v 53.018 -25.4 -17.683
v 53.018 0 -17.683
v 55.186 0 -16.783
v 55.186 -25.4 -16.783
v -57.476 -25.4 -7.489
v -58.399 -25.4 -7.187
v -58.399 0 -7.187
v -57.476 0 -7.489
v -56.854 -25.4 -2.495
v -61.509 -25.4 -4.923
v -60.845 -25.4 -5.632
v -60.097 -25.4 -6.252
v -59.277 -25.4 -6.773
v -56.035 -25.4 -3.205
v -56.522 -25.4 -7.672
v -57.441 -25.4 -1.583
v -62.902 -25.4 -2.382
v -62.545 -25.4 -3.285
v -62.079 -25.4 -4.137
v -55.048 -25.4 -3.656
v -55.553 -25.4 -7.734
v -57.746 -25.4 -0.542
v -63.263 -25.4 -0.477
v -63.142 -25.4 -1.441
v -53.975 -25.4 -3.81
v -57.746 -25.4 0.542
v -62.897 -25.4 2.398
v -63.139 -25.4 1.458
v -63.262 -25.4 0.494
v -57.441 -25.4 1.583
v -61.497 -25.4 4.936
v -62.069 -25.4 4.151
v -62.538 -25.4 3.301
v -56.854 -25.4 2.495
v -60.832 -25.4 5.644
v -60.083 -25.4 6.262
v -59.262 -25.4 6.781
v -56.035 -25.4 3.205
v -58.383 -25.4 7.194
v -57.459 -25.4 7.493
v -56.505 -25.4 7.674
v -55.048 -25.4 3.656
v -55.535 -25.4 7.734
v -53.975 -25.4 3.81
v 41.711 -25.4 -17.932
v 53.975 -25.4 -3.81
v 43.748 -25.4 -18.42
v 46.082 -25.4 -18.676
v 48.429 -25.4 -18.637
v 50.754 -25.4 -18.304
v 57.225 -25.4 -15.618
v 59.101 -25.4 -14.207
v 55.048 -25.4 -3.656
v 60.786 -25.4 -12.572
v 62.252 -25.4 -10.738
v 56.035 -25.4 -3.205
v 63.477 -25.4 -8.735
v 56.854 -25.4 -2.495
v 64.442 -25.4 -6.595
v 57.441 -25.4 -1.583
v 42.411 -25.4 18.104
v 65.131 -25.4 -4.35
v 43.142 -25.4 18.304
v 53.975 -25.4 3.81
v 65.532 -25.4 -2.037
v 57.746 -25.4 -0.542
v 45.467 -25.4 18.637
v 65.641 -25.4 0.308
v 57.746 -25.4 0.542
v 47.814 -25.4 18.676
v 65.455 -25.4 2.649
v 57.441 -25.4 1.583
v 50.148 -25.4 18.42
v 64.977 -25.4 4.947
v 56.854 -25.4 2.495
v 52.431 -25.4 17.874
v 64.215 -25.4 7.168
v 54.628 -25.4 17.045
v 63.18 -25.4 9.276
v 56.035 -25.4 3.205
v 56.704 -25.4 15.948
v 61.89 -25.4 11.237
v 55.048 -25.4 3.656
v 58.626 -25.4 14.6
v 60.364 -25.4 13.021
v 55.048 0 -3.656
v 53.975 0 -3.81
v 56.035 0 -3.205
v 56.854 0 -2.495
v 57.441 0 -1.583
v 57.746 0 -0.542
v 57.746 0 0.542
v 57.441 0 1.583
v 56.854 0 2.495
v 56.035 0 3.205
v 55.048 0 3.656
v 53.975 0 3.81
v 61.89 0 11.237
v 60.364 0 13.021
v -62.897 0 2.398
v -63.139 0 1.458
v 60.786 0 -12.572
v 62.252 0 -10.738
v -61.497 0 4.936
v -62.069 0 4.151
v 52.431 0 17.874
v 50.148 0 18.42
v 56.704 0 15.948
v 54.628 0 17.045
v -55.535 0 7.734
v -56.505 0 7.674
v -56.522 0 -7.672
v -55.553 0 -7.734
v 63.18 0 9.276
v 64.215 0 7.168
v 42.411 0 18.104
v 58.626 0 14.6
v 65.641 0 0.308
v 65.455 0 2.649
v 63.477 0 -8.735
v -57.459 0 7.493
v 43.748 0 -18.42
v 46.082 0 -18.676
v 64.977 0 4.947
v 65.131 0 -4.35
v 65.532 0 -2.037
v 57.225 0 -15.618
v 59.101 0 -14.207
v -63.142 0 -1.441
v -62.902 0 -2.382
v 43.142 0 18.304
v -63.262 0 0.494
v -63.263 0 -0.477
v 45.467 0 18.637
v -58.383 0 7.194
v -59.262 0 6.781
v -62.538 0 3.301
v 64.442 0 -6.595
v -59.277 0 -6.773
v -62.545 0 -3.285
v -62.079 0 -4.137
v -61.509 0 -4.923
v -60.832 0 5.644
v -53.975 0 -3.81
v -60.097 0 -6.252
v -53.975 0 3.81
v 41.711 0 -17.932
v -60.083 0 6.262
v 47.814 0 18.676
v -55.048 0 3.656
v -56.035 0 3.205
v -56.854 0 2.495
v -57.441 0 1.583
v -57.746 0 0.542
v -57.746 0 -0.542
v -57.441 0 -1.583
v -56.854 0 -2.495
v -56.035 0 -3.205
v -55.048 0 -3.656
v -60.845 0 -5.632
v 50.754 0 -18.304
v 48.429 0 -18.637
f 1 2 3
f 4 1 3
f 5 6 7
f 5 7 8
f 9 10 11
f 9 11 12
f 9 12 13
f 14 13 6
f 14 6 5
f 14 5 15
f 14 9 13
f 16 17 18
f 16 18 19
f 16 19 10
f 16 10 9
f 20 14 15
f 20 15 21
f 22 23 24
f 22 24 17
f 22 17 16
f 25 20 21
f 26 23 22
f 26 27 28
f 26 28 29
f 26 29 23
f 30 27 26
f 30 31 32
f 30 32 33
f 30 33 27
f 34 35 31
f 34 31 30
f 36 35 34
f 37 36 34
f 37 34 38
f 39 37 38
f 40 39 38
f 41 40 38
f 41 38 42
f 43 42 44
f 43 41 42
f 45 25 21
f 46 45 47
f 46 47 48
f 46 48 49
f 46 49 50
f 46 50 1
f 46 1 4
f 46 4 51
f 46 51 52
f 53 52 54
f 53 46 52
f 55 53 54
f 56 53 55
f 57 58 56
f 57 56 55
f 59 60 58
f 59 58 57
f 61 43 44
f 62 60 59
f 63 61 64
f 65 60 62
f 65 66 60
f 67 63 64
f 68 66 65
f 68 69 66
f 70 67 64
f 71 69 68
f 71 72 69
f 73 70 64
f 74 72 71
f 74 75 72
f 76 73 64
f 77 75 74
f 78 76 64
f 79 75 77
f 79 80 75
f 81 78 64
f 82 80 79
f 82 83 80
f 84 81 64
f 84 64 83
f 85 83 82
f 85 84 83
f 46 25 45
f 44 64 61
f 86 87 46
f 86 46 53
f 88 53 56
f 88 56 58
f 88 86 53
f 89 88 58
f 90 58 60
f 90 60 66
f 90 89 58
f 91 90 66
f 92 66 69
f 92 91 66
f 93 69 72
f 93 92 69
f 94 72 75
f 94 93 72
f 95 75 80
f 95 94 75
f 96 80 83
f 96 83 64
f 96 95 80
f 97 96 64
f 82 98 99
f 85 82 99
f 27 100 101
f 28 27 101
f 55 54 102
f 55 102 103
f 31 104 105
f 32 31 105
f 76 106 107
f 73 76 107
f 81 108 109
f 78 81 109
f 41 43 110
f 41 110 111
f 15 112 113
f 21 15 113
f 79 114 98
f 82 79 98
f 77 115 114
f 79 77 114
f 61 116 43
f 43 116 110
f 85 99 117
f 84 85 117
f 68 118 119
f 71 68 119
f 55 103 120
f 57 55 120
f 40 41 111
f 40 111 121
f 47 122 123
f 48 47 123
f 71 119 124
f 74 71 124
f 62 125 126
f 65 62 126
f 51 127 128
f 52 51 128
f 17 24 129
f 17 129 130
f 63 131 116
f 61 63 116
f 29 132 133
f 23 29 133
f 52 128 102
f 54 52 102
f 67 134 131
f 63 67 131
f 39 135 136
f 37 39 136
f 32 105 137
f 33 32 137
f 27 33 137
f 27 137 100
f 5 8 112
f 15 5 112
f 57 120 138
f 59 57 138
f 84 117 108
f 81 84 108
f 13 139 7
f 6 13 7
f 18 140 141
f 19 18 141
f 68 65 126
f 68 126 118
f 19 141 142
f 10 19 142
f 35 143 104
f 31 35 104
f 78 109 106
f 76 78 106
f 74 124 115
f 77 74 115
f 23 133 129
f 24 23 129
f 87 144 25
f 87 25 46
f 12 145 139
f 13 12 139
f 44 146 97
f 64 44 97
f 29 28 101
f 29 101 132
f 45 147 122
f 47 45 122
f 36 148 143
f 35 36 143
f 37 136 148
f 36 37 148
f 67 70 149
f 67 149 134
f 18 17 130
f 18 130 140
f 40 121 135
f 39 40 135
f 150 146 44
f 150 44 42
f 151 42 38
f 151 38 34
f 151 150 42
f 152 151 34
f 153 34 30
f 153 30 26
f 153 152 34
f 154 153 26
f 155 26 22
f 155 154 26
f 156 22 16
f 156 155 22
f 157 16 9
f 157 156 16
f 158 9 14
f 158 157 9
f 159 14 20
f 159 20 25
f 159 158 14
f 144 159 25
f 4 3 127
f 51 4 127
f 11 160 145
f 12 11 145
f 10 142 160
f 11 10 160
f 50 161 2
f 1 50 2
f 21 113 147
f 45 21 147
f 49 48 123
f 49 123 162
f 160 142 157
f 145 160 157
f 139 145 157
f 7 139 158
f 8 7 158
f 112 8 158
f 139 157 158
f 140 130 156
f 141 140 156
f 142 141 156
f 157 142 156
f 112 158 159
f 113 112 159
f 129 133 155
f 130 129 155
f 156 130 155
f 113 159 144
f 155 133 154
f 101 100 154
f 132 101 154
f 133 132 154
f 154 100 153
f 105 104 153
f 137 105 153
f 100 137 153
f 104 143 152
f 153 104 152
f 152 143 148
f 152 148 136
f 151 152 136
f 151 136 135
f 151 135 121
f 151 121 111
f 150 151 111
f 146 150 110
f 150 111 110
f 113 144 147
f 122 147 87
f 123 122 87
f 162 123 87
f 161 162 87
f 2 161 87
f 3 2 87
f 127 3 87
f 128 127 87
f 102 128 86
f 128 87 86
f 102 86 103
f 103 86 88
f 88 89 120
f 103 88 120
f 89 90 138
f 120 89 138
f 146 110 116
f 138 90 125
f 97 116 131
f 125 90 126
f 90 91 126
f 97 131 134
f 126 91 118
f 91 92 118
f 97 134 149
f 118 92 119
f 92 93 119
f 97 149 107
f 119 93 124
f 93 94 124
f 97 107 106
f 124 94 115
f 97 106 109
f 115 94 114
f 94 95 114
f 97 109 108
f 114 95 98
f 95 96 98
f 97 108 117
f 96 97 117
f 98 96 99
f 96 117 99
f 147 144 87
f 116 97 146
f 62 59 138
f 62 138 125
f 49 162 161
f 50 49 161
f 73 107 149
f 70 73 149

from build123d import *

# Parameters (mm, degrees)
F1_DEPTH = 25.4
F2_W     = 107.95
F2_H     = 7.62
F3_DEPTH = 25.4


with BuildPart() as f1:
    # F0 (on Front) → F1 (new body)
    with BuildSketch(Plane.XZ):
        Polygon((34.795007, 14.206795), (36.671421, 15.617947), (38.709903, 16.782795), (40.878305, 17.682968), (42.411124, 18.103591), (-55.535455, 7.733652), (-54.566239, 7.671582), (-53.612446, 7.488527), (-52.689117, 7.187373), (-51.810813, 6.77287), (-50.991386, 6.251554), (-50.243758, 5.631648), (-49.57972, 4.922928), (-49.009745, 4.13657), (-48.542821, 3.284975), (-48.186312, 2.381575), (-47.94584, 1.440616), (-47.825198, 0.476938), (-47.826288, -0.494263), (-47.949093, -1.457668), (-48.191676, -2.398085), (-48.550212, -3.300683), (-49.019046, -4.151227), (-49.590785, -4.936303), (-50.256412, -5.643531), (-51.005429, -6.261758), (-51.826025, -6.781233), (-52.705257, -7.193763), (-53.62926, -7.492844), (-54.583462, -7.673758), (-55.552814, -7.733652), (41.71096, -17.93242), (41.464741, -17.873512), (39.267833, -17.045337), (37.192046, -15.948346), (35.270117, -14.599841), (33.532356, -13.021087), (32.006168, -11.236983), (30.715621, -9.275665), (29.681069, -7.168064), (28.918828, -4.947418), (28.440918, -2.648749), (28.254875, -0.308308), (28.363635, 2.036996), (28.765482, 4.350175), (29.454078, 6.59475), (30.418564, 8.735321), (31.64373, 10.738131), (33.110254, 12.571594), align=None)
        Polygon((38.709903, 16.782795), (36.671421, 15.617947), (34.795007, 14.206795), (33.110254, 12.571594), (31.64373, 10.738131), (30.418564, 8.735321), (29.454078, 6.59475), (28.765482, 4.350175), (28.363635, 2.036996), (28.254875, -0.308308), (28.440918, -2.648749), (28.918828, -4.947418), (29.681069, -7.168064), (30.715621, -9.275665), (32.006168, -11.236983), (33.532356, -13.021087), (35.270117, -14.599841), (37.192046, -15.948346), (39.267833, -17.045337), (41.464741, -17.873512), (41.71096, -17.93242), (48.429475, -18.636902), (50.753616, -18.30427), (53.017741, -17.682968), (55.186143, -16.782795), (57.224625, -15.617947), (59.101039, -14.206795), (60.785793, -12.571594), (62.252316, -10.738131), (63.477482, -8.735321), (64.441968, -6.59475), (65.130564, -4.350175), (65.532411, -2.036996), (65.641171, 0.308308), (65.455129, 2.648749), (64.977218, 4.947418), (64.214977, 7.168064), (63.180425, 9.275665), (61.889879, 11.236983), (60.36369, 13.021087), (58.625929, 14.599841), (56.704, 15.948346), (54.628213, 17.045337), (52.431306, 17.873512), (50.147923, 18.419812), (47.814076, 18.67562), (42.411124, 18.103591), (40.878305, 17.682968), align=None)
        Polygon((43.14243, 18.30427), (42.411124, 18.103591), (47.814076, 18.67562), (45.466571, 18.636902), align=None)
        Polygon((-54.566239, 7.671582), (-55.535455, 7.733652), (-56.504807, 7.673758), (-57.459008, 7.492844), (-58.383011, 7.193763), (-59.262244, 6.781233), (-60.082839, 6.261758), (-60.831856, 5.643531), (-61.497483, 4.936303), (-62.069222, 4.151227), (-62.538056, 3.300683), (-62.896592, 2.398085), (-63.139176, 1.457668), (-63.261981, 0.494263), (-63.263071, -0.476938), (-63.142429, -1.440616), (-62.901957, -2.381575), (-62.545448, -3.284975), (-62.078524, -4.13657), (-61.508548, -4.922928), (-60.844511, -5.631648), (-60.096883, -6.251554), (-59.277456, -6.77287), (-58.399152, -7.187373), (-57.475822, -7.488527), (-56.522029, -7.671582), (-55.552814, -7.733652), (-54.583462, -7.673758), (-53.62926, -7.492844), (-52.705257, -7.193763), (-51.826025, -6.781233), (-51.005429, -6.261758), (-50.256412, -5.643531), (-49.590785, -4.936303), (-49.019046, -4.151227), (-48.550212, -3.300683), (-48.191676, -2.398085), (-47.949093, -1.457668), (-47.826288, -0.494263), (-47.825198, 0.476938), (-47.94584, 1.440616), (-48.186312, 2.381575), (-48.542821, 3.284975), (-49.009745, 4.13657), (-49.57972, 4.922928), (-50.243758, 5.631648), (-50.991386, 6.251554), (-51.810813, 6.77287), (-52.689117, 7.187373), (-53.612446, 7.488527), align=None)
        Polygon((48.429475, -18.636902), (41.71096, -17.93242), (43.748123, -18.419812), (46.08197, -18.67562), align=None)
    extrude(amount=F1_DEPTH)

    # F2 (on Front) → F3 (cut)
    with BuildSketch(Plane.XZ):
        Rectangle(F2_W, F2_H)
        with BuildLine():
            Line((-53.975, -3.81), (-53.975, 3.81))
            ThreePointArc((-53.975, 3.81), (-57.785, 0), (-53.975, -3.81))
        make_face()
        with BuildLine():
            ThreePointArc((53.975, -3.81), (57.785, 0), (53.975, 3.81))
            Line((53.975, 3.81), (53.975, -3.81))
        make_face()
    extrude(amount=F3_DEPTH, mode=Mode.SUBTRACT)


solid = f1.part
